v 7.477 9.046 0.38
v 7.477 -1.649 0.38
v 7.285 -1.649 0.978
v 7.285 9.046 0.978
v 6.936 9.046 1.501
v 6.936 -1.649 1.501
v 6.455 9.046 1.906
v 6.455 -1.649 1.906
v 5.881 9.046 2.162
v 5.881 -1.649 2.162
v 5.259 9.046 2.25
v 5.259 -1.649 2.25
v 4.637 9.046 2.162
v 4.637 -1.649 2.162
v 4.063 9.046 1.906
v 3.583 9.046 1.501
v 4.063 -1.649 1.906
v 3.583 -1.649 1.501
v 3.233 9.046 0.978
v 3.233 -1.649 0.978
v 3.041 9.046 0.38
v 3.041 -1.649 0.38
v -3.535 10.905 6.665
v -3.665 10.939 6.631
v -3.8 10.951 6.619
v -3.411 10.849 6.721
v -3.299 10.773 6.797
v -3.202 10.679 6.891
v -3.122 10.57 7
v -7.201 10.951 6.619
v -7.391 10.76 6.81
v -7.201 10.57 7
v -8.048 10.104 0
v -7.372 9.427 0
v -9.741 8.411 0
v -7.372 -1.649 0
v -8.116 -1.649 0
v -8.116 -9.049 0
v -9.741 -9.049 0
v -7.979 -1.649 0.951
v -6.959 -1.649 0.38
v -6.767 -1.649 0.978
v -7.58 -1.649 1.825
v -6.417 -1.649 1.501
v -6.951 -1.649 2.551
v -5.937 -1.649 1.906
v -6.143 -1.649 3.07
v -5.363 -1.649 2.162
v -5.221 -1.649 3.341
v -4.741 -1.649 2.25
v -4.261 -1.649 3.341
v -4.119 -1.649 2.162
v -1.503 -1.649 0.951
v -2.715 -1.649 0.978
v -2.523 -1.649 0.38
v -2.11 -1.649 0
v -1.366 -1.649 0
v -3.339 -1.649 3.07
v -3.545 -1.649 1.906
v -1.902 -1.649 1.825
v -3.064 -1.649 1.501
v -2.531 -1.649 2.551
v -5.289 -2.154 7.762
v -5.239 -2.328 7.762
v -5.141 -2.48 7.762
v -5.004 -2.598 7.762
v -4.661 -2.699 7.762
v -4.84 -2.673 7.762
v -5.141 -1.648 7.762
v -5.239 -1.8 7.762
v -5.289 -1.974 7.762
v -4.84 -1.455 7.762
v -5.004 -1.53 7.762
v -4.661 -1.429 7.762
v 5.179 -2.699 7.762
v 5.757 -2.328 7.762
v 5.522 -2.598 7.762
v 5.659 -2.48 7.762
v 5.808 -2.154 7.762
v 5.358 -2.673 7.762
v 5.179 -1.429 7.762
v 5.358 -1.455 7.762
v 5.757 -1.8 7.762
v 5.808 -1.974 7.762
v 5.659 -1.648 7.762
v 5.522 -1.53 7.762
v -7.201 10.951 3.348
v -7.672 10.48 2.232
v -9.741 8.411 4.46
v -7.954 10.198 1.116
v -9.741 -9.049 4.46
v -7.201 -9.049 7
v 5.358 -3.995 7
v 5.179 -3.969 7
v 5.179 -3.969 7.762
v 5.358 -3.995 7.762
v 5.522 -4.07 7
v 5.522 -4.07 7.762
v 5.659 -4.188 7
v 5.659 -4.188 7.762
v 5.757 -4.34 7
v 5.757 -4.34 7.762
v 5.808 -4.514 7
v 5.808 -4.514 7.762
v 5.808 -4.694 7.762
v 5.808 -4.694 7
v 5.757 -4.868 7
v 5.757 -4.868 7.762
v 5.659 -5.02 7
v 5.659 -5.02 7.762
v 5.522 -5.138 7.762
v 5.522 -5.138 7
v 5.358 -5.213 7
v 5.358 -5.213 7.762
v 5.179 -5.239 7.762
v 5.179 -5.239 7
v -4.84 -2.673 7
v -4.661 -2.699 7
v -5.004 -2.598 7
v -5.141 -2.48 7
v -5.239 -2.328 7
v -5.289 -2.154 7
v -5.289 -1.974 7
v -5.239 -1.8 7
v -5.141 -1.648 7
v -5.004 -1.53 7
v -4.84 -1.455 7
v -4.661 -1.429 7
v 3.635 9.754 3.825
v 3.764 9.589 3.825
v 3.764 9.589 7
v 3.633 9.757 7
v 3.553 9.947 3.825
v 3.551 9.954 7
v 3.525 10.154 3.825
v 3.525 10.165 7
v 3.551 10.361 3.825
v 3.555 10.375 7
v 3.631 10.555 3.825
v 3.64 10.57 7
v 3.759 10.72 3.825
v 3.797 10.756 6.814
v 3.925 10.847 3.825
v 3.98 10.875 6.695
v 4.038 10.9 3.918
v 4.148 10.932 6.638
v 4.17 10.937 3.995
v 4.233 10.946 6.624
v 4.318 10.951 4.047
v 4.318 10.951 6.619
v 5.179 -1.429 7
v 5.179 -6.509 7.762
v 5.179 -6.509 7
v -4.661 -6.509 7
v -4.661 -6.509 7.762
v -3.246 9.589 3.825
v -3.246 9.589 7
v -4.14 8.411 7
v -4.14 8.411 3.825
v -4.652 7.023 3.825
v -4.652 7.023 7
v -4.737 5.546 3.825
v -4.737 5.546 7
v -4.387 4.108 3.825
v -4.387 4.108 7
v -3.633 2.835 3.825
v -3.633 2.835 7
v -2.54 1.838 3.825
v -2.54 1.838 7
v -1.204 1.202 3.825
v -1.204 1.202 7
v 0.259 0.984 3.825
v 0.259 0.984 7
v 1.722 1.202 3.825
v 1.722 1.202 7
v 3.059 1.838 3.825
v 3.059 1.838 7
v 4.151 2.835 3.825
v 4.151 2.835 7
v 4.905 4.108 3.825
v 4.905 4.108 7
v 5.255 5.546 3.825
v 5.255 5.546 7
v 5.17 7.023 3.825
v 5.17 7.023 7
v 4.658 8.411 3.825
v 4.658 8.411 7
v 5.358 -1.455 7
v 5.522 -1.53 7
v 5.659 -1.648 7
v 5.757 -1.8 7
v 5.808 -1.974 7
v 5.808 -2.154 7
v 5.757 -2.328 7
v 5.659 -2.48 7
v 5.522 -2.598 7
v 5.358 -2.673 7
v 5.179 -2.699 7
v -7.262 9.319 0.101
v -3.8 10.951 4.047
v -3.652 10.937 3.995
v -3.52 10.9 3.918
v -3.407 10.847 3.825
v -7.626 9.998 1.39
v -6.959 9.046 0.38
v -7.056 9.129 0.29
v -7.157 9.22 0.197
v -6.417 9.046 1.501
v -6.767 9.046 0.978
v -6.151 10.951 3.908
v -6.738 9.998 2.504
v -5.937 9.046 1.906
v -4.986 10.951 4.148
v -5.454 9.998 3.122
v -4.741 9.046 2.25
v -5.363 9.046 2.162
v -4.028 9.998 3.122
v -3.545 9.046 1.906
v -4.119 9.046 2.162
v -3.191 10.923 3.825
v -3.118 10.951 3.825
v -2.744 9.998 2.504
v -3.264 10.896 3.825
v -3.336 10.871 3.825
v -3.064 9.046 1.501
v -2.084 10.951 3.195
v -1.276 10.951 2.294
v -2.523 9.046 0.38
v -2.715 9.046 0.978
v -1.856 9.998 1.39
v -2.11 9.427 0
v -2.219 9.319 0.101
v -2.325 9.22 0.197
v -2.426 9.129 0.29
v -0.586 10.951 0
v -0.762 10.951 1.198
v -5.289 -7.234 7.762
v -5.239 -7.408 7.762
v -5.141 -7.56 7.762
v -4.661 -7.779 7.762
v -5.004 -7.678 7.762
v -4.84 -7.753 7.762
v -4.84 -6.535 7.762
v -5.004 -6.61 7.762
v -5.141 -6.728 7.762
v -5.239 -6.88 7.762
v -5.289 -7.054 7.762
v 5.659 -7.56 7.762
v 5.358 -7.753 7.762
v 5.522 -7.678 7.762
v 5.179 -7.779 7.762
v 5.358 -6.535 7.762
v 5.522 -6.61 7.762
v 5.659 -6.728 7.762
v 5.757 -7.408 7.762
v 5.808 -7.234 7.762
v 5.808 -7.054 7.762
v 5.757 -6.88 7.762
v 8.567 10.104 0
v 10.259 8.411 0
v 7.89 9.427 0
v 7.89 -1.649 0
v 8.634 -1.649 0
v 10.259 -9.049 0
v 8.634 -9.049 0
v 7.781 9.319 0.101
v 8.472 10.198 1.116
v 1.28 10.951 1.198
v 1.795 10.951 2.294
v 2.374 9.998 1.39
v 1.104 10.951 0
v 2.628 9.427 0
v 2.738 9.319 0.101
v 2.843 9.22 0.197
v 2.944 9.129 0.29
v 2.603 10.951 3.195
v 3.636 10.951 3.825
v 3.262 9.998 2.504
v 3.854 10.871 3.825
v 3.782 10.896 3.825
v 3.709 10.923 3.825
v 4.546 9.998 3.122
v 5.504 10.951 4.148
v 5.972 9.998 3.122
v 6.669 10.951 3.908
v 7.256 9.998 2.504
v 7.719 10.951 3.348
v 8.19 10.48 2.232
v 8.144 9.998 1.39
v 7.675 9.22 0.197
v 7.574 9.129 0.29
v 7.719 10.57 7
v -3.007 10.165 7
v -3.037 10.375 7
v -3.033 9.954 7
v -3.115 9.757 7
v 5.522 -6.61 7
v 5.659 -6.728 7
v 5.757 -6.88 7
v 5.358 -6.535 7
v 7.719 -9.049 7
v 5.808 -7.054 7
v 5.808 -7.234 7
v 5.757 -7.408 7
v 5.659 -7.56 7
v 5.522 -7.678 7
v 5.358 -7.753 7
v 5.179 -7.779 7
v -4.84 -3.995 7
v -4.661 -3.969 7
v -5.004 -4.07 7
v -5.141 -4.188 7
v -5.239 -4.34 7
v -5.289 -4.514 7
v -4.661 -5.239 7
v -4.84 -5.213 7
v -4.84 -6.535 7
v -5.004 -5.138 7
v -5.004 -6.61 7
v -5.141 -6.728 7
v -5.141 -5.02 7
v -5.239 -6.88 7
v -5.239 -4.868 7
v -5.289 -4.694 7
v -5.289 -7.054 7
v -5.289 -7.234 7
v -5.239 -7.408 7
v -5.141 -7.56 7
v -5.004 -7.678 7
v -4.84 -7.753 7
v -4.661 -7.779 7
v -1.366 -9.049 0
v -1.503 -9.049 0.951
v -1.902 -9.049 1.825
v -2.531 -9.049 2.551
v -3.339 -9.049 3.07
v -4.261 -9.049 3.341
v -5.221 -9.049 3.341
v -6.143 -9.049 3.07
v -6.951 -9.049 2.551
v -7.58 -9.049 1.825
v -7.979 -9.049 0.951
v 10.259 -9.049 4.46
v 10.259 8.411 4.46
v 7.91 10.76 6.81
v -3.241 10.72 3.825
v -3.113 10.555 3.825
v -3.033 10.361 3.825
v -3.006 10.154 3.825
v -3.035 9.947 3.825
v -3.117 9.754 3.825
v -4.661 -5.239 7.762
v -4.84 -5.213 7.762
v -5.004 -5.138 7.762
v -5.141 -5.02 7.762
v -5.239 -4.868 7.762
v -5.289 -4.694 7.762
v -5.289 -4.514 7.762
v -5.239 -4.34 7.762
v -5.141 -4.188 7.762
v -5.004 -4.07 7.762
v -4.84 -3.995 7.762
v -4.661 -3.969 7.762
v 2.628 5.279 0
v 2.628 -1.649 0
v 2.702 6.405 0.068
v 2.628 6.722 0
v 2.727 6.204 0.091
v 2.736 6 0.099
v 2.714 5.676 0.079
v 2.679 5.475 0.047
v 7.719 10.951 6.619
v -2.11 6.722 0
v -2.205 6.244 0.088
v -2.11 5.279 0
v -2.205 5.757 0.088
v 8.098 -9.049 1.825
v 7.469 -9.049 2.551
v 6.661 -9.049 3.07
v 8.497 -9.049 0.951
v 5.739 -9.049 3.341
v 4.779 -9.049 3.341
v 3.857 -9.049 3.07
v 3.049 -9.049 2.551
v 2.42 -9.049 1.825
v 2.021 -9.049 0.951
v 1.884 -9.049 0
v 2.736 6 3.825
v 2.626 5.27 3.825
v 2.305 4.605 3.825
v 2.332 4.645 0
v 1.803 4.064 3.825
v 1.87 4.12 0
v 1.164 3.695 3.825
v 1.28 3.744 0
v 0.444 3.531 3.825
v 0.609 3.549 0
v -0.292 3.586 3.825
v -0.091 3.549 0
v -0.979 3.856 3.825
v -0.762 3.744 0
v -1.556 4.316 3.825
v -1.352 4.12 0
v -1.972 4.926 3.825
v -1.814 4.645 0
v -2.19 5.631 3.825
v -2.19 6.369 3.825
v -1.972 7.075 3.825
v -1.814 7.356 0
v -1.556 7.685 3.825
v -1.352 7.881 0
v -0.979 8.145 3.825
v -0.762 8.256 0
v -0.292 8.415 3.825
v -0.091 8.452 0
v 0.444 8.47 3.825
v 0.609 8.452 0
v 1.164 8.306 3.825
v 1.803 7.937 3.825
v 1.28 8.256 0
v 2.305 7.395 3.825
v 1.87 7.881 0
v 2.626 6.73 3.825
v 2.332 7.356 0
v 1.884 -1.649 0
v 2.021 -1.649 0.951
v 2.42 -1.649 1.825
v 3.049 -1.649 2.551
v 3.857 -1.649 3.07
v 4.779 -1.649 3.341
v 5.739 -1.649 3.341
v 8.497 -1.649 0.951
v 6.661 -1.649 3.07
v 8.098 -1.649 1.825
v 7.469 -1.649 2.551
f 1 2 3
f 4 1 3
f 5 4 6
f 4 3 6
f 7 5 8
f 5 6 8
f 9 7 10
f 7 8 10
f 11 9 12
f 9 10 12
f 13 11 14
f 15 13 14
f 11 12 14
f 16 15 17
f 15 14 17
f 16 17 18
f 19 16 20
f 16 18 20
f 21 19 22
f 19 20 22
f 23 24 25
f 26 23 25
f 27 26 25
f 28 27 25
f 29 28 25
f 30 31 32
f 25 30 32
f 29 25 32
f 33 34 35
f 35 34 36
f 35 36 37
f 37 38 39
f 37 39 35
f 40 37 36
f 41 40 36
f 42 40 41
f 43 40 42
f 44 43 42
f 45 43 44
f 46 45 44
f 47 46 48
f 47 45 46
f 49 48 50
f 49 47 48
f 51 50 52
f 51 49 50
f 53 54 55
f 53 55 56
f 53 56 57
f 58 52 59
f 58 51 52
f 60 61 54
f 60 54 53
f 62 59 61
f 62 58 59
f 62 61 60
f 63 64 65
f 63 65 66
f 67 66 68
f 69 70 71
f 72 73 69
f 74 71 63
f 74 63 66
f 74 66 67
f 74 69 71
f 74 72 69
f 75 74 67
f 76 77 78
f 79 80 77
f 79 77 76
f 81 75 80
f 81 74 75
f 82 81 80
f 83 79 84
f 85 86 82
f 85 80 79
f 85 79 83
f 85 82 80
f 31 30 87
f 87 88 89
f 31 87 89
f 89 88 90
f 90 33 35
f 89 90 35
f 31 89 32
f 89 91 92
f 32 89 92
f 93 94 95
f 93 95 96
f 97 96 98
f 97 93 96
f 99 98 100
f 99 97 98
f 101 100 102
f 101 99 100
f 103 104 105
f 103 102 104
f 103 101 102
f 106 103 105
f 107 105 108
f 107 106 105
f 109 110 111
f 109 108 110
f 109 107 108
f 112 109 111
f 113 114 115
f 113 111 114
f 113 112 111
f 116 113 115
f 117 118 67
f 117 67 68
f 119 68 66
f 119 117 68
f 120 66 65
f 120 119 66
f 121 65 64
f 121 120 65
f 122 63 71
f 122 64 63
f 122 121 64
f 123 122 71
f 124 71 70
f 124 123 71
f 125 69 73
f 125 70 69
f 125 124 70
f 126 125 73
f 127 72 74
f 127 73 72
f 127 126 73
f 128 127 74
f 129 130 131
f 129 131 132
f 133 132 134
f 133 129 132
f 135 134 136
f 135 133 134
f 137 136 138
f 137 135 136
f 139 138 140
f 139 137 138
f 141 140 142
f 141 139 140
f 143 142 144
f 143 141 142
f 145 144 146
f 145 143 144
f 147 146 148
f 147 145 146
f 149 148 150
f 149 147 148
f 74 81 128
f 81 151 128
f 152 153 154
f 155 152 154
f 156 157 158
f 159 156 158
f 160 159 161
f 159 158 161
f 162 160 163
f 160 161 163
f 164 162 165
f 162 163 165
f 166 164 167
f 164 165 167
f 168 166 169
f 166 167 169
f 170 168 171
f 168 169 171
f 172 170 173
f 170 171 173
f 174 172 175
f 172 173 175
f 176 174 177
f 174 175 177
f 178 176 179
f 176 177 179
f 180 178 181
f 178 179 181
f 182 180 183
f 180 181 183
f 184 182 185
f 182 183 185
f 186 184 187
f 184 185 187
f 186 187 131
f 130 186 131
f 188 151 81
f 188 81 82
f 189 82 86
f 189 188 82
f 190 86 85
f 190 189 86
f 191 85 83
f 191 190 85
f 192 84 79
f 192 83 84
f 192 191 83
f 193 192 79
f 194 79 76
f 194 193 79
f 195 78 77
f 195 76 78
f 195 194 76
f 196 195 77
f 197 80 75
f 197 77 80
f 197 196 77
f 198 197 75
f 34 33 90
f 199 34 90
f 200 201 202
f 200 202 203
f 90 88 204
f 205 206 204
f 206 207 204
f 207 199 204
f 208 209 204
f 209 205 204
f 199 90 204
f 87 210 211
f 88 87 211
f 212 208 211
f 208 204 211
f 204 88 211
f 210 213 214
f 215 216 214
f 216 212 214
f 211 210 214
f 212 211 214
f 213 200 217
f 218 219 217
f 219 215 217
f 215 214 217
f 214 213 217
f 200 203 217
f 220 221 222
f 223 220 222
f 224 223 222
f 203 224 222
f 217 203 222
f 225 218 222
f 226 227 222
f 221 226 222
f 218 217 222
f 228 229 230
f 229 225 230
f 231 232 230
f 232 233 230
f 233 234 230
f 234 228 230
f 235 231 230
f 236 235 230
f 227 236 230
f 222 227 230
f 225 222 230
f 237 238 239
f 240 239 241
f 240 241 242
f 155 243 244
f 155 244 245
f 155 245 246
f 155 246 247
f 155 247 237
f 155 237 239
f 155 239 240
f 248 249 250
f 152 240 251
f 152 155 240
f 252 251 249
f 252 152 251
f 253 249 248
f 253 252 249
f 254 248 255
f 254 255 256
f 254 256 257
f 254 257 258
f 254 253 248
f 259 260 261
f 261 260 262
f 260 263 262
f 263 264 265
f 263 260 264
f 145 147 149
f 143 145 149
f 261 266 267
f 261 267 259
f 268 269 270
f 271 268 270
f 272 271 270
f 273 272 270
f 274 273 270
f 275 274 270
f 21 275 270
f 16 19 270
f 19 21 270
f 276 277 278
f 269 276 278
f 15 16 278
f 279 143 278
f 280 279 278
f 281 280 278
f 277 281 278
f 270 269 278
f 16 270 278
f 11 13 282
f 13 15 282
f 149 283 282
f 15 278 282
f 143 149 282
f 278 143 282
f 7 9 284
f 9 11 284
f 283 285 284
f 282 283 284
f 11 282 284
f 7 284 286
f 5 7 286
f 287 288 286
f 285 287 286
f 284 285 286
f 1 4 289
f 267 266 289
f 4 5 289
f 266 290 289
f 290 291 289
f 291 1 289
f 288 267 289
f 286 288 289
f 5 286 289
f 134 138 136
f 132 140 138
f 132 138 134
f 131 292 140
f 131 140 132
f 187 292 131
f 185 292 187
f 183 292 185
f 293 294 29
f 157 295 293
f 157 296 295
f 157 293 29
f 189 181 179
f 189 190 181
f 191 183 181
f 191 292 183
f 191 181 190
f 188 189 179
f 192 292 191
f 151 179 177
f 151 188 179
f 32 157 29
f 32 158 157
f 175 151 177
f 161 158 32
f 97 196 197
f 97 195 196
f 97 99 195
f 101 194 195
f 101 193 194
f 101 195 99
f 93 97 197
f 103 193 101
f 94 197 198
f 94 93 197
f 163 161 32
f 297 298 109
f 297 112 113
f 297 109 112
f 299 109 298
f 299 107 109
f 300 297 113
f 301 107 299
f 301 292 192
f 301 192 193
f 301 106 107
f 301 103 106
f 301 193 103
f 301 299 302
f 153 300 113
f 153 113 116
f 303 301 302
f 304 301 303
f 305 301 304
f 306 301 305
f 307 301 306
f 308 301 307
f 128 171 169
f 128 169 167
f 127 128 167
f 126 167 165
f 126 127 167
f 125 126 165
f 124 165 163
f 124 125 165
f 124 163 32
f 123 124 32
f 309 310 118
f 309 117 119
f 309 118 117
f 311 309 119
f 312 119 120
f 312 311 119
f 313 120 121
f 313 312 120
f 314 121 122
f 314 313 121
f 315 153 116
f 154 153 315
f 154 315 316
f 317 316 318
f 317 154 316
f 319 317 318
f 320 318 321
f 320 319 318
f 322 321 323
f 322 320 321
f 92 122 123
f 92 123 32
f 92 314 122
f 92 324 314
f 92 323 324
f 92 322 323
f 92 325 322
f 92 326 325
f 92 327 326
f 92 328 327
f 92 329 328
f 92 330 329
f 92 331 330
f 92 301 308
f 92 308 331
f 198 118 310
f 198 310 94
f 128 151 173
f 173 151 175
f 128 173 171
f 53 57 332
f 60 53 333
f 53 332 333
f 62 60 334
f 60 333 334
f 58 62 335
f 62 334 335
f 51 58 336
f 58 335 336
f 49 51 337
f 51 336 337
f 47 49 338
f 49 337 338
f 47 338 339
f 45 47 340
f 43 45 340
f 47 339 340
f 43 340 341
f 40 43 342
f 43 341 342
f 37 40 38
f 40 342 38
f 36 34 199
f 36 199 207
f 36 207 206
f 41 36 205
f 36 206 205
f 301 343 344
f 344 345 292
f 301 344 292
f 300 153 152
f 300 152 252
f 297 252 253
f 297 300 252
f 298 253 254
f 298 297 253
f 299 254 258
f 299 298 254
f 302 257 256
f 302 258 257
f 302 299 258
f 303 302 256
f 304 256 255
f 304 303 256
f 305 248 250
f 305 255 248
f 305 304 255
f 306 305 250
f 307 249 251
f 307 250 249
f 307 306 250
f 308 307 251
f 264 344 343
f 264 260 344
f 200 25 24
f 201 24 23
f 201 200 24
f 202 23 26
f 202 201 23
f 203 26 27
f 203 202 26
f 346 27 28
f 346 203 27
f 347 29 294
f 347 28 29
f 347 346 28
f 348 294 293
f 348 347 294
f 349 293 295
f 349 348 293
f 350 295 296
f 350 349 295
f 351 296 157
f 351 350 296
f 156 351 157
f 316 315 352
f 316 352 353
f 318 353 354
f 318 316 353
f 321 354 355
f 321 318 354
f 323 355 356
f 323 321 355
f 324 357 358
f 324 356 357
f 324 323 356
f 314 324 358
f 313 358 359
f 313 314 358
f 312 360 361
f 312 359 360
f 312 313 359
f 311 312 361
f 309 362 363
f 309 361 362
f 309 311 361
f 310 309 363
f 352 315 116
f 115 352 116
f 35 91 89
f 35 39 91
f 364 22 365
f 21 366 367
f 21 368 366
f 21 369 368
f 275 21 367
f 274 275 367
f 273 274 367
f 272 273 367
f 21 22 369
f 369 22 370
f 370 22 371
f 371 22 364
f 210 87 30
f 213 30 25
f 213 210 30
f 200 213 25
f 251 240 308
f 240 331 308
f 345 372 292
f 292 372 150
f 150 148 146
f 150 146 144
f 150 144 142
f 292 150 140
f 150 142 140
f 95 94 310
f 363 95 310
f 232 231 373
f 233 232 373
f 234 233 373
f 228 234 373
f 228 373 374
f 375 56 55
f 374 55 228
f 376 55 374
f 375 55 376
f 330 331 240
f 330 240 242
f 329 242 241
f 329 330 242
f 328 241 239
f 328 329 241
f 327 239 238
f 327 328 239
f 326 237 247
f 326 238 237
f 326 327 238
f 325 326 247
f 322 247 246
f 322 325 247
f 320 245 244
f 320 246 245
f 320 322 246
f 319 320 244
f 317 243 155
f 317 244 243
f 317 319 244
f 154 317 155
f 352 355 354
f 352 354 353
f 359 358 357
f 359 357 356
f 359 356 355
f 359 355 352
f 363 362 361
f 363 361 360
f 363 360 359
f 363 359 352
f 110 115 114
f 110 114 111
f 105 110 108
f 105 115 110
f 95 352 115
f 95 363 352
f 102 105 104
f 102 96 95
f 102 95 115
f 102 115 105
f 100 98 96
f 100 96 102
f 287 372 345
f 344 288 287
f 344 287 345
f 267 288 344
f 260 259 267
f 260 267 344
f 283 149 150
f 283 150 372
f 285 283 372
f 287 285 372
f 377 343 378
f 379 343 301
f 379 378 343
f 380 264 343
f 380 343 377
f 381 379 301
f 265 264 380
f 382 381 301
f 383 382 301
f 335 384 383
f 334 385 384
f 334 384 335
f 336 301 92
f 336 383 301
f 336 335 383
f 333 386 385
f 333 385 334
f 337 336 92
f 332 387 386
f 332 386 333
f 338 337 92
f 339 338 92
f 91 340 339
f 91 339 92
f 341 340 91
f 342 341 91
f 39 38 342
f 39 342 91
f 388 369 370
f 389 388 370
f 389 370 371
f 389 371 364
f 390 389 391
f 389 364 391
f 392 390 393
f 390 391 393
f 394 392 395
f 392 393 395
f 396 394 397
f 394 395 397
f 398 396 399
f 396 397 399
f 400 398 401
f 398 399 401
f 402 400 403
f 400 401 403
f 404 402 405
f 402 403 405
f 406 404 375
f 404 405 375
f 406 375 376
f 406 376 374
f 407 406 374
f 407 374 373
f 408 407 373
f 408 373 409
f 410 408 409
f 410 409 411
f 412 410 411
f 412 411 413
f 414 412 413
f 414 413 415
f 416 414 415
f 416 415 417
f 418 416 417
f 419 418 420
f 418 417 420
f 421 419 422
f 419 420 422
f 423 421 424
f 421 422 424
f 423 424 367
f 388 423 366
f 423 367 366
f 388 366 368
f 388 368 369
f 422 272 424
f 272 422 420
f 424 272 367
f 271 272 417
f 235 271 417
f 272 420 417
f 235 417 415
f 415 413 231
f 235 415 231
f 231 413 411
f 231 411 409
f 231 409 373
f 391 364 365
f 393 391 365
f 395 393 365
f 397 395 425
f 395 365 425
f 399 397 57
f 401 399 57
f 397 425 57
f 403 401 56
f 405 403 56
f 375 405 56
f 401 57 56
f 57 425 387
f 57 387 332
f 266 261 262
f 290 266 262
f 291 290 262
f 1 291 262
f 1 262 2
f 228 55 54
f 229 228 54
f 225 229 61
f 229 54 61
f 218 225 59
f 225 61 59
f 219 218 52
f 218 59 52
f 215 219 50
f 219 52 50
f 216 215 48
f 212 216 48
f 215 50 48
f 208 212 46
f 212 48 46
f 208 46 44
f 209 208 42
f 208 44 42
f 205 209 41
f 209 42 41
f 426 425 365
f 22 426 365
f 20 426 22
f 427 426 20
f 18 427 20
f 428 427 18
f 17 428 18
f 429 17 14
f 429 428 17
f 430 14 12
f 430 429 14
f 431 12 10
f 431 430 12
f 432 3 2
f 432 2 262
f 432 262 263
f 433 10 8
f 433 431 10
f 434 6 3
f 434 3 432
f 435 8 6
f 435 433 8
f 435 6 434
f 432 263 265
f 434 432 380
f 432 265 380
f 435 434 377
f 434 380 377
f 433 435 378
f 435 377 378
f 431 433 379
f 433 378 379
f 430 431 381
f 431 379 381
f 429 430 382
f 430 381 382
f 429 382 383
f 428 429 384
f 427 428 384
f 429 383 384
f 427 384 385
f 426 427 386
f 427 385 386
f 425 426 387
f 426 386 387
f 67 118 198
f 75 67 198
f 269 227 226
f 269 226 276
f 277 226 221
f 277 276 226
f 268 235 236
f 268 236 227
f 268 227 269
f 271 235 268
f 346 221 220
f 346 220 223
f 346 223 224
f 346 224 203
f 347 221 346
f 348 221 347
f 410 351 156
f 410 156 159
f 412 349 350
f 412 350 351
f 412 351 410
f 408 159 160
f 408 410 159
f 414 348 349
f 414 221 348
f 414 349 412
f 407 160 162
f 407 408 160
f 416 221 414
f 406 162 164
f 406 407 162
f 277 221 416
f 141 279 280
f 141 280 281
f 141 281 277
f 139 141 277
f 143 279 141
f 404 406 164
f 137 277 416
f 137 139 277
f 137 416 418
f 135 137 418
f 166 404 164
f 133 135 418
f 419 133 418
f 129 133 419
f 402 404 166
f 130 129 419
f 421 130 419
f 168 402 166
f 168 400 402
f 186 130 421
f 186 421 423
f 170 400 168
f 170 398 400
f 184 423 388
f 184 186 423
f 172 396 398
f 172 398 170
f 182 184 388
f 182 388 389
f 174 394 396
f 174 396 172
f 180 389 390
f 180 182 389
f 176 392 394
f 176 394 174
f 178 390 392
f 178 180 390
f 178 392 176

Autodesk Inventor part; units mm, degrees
ref_plane "YZ Plane" through (0, 0, 0) normal (1, 0, 0) x (0, 1, 0)
ref_plane "XZ Plane" through (0, 0, 0) normal (0, 1, 0) x (-1, 0, 0)
ref_plane "XY Plane" through (0, 0, 0) normal (0, 0, 1) x (1, 0, 0)
sketch "Sketch1" plane through (0, 0, 0) normal (0, 1, 0) x (-1, 0, 0)
  line L0 (-10.2591, 9.049) -> (9.7409, 9.049)
  line L1 (9.7409, 9.049) -> (9.7409, -10.951)
  line L2 (9.7409, -10.951) -> (-10.2591, -10.951)
  line L3 (-10.2591, -10.951) -> (-10.2591, 9.049)
  point P0 (0, 0)
  dimension "d0" = 20
  dimension "d1" = 20
extrude "Extrusion1" add sketch "Sketch1" along normal blind 7
sketch "Sketch2" plane through (-9.7409, 0, 9.049) normal (0, 0, 1) x (1, 0, 0)
  line L0 (20, 0) -> (0, 0) projected
  line L1 (20, 0) -> (20, 7) projected
  line L2 (0, 0) -> (0, 7) projected
  circle A0 centre (15, 0) radius 3.375
  circle A1 centre (5, 0) radius 3.375
  point P0 (9.7409, 0)
  dimension "d4" = 6.75
  dimension "d5" = 6.75
  dimension "d6" = 5
  dimension "d7" = 5
  dimension "d32" = 10
extrude "Extrusion2" cut sketch "Sketch2" against normal blind 7.4
sketch "Sketch3" plane through (-9.7409, 0, 1.649) normal (0, 0, 1) x (1, 0, 0)
  arc A0 (8.375, 0) -> (1.625, 0) centre (5, 0) ccw projected
  line L0 (18.375, 0) -> (11.625, 0) projected
  arc A1 (18.375, 0) -> (11.625, 0) centre (15, 0) ccw projected
  circle A2 centre (15, 0) radius 2.25
  circle A3 centre (5, 0) radius 2.25
  point P0 (9.7409, 0)
  dimension "d10" = 4.5
  dimension "d11" = 4.5
extrude "Extrusion3" cut sketch "Sketch3" against normal through all contours A2 L0 | L0 A2 | A3
sketch "Sketch4" plane through (0, 0, 0) normal (0, -1, 0) x (1, 0, 0)
  line L0 (-2.4909, 1.649) -> (-2.4909, -10.951) projected
  line L1 (3.0091, -10.951) -> (3.0091, 1.649) projected
  circle A0 centre (0.2591, -6.0003) radius 2.4765
  point P0 (0, 0)
  dimension "d14" = 4.953
  dimension "d15" = 5.5
  dimension "d16" = 2.75
extrude "Extrusion4" cut sketch "Sketch4" against normal through all
chamfer "Chamfer1" distance 1.905 angle 45 2 edges at (5.2591, 2.25, -10.951) (-4.7409, 2.25, -10.951)
chamfer "Chamfer2" distance 0.381 angle 45 5 edges at (-2.4909, 0, -3.6985) (-6.9909, 0, -3.6985) (7.5091, 0, -3.6985) (3.0091, 0, -3.6985) (0.2591, 7, -10.951)
chamfer "Chamfer3" distance 2.54 angle 45 4 edges at (-9.7409, 7, -0.7605) (10.2591, 7, -0.7605) (-9.7409, 3.3095, -10.951) (10.2591, 3.3095, -10.951)
sketch "Sketch5" plane through (0, 7, 0) normal (0, 1, 0) x (1, 0, 0)
  line L0 (-7.2009, 10.57) -> (7.7191, 10.57) projected
  circle A0 centre (0.2591, 6.0003) radius 2.4765 projected
  line L1 (3.1554, 0.9838) -> (-2.6371, 0.9838)
  line L2 (-2.6371, 0.9838) -> (-5.5334, 6.0003)
  line L3 (-5.5334, 6.0003) -> (-2.6371, 11.0168)
  line L4 (-2.6371, 11.0168) -> (3.1554, 11.0168)
  line L5 (3.1554, 11.0168) -> (6.0517, 6.0003)
  line L6 (6.0517, 6.0003) -> (3.1554, 0.9838)
  circle A1 centre (0.2591, 6.0003) radius 5.0165
  point P0 (0, 0)
  dimension "d29" = 10.033
  dimension "d47" = 10.033
extrude "Extrusion5" cut sketch "Sketch5" against normal blind 3.175 contours A1 L0 | L0 A1
sketch "Sketch6" plane through (0, 7, 0) normal (0, 1, 0) x (1, 0, 0)
  line L0 (-7.2009, -9.049) -> (-7.2009, 10.57) projected
  line L1 (-7.2009, -9.049) -> (7.7191, -9.049) projected
  line L2 (7.7191, 10.57) -> (7.7191, -9.049) projected
  line L3 (-7.2009, 10.57) -> (7.7191, 10.57) projected
  line L4 (-4.6609, -7.144) -> (5.1791, -7.144) construction
  line L5 (-4.6609, -7.779) -> (5.1791, -7.779)
  line L6 (5.1791, -6.509) -> (-4.6609, -6.509)
  arc A0 (-4.6609, -6.509) -> (-4.6609, -7.779) centre (-4.6609, -7.144) ccw
  arc A1 (5.1791, -7.779) -> (5.1791, -6.509) centre (5.1791, -7.144) ccw
  line L7 (-4.6609, -5.239) -> (5.1791, -5.239)
  line L8 (5.1791, -3.969) -> (-4.6609, -3.969)
  arc A2 (-4.6609, -3.969) -> (-4.6609, -5.239) centre (-4.6609, -4.604) ccw
  arc A3 (5.1791, -5.239) -> (5.1791, -3.969) centre (5.1791, -4.604) ccw
  line L9 (-4.6609, -2.699) -> (5.1791, -2.699)
  line L10 (5.1791, -1.429) -> (-4.6609, -1.429)
  arc A4 (-4.6609, -1.429) -> (-4.6609, -2.699) centre (-4.6609, -2.064) ccw
  arc A5 (5.1791, -2.699) -> (5.1791, -1.429) centre (5.1791, -2.064) ccw
  point P0 (3.4133, 10.57)
  point P1 (0, 0)
  point P2 (0.2591, -7.144)
  dimension "d33" = 1.27
  dimension "d34" = 2.54
  dimension "d35" = 2.54
  dimension "d36" = 1.905
  dimension "d39" = 2.54
extrude "Extrusion6" add sketch "Sketch6" along normal blind 0.762 contours A0 L6 A1 L5 | A2 L8 A3 L7 | A4 L10 A5 L9
fillet "Fillet1" radius 0.7937 2 edges at (1.0688, 5.222, -10.951) (-0.5505, 5.222, -10.951)
move or copy body "Move Body1" bodies to move or copy 1 copy no rotation origin (0, 0, 0) rotation axis (1, 0, 0) rotation angle 90
equation "\"d16\" = 0.5 * d15"
properties part number "key_half_screw"
